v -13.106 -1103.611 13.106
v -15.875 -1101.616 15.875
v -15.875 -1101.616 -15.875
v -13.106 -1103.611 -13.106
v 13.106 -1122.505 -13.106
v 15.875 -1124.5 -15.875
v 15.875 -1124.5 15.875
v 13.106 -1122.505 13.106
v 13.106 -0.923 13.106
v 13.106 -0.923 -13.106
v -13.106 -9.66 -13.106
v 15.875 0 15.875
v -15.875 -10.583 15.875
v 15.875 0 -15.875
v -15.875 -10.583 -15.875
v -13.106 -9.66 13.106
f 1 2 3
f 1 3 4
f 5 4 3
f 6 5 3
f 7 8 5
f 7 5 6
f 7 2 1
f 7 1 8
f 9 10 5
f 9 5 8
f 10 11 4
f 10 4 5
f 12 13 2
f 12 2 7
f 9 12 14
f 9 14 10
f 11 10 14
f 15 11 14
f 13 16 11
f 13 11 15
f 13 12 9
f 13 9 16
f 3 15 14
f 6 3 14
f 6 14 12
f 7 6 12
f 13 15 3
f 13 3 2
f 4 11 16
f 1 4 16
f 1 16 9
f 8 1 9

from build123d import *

# Parameters (mm, degrees)
SKETCH_W        = 31.75
SKETCH_H        = 31.75
SKETCH_W_2      = 26.2128
SKETCH_H_2      = 26.2128
PAD_DEPTH       = 1124.5
POCKET_DEPTH    = 31.75
POCKET001_DEPTH = 31.75


with BuildPart() as part:
    # Sketch → Pad (new body)
    with BuildSketch(Plane.XZ):
        Rectangle(SKETCH_W, SKETCH_H)
        Rectangle(SKETCH_W_2, SKETCH_H_2, mode=Mode.SUBTRACT)
    extrude(amount=PAD_DEPTH)

    # Sketch001 → Pocket (cut)
    with BuildSketch(Plane(origin=(0, 0, 15.875), x_dir=(-1, 0, 0), z_dir=(0, 0, 1))):
        Polygon((15.875, 0), (-15.875, 0), (15.875, 10.583303), align=None)
    extrude(amount=-POCKET_DEPTH, mode=Mode.SUBTRACT)

    # Sketch002 → Pocket001 (cut)
    with BuildSketch(Plane(origin=(0, 0, 15.875), x_dir=(-1, 0, 0), z_dir=(0, 0, 1))):
        Polygon((-15.875, 1124.5), (15.875, 1124.5), (15.875, 1101.615832), align=None)
    extrude(amount=-POCKET001_DEPTH, mode=Mode.SUBTRACT)


solid = part.part
